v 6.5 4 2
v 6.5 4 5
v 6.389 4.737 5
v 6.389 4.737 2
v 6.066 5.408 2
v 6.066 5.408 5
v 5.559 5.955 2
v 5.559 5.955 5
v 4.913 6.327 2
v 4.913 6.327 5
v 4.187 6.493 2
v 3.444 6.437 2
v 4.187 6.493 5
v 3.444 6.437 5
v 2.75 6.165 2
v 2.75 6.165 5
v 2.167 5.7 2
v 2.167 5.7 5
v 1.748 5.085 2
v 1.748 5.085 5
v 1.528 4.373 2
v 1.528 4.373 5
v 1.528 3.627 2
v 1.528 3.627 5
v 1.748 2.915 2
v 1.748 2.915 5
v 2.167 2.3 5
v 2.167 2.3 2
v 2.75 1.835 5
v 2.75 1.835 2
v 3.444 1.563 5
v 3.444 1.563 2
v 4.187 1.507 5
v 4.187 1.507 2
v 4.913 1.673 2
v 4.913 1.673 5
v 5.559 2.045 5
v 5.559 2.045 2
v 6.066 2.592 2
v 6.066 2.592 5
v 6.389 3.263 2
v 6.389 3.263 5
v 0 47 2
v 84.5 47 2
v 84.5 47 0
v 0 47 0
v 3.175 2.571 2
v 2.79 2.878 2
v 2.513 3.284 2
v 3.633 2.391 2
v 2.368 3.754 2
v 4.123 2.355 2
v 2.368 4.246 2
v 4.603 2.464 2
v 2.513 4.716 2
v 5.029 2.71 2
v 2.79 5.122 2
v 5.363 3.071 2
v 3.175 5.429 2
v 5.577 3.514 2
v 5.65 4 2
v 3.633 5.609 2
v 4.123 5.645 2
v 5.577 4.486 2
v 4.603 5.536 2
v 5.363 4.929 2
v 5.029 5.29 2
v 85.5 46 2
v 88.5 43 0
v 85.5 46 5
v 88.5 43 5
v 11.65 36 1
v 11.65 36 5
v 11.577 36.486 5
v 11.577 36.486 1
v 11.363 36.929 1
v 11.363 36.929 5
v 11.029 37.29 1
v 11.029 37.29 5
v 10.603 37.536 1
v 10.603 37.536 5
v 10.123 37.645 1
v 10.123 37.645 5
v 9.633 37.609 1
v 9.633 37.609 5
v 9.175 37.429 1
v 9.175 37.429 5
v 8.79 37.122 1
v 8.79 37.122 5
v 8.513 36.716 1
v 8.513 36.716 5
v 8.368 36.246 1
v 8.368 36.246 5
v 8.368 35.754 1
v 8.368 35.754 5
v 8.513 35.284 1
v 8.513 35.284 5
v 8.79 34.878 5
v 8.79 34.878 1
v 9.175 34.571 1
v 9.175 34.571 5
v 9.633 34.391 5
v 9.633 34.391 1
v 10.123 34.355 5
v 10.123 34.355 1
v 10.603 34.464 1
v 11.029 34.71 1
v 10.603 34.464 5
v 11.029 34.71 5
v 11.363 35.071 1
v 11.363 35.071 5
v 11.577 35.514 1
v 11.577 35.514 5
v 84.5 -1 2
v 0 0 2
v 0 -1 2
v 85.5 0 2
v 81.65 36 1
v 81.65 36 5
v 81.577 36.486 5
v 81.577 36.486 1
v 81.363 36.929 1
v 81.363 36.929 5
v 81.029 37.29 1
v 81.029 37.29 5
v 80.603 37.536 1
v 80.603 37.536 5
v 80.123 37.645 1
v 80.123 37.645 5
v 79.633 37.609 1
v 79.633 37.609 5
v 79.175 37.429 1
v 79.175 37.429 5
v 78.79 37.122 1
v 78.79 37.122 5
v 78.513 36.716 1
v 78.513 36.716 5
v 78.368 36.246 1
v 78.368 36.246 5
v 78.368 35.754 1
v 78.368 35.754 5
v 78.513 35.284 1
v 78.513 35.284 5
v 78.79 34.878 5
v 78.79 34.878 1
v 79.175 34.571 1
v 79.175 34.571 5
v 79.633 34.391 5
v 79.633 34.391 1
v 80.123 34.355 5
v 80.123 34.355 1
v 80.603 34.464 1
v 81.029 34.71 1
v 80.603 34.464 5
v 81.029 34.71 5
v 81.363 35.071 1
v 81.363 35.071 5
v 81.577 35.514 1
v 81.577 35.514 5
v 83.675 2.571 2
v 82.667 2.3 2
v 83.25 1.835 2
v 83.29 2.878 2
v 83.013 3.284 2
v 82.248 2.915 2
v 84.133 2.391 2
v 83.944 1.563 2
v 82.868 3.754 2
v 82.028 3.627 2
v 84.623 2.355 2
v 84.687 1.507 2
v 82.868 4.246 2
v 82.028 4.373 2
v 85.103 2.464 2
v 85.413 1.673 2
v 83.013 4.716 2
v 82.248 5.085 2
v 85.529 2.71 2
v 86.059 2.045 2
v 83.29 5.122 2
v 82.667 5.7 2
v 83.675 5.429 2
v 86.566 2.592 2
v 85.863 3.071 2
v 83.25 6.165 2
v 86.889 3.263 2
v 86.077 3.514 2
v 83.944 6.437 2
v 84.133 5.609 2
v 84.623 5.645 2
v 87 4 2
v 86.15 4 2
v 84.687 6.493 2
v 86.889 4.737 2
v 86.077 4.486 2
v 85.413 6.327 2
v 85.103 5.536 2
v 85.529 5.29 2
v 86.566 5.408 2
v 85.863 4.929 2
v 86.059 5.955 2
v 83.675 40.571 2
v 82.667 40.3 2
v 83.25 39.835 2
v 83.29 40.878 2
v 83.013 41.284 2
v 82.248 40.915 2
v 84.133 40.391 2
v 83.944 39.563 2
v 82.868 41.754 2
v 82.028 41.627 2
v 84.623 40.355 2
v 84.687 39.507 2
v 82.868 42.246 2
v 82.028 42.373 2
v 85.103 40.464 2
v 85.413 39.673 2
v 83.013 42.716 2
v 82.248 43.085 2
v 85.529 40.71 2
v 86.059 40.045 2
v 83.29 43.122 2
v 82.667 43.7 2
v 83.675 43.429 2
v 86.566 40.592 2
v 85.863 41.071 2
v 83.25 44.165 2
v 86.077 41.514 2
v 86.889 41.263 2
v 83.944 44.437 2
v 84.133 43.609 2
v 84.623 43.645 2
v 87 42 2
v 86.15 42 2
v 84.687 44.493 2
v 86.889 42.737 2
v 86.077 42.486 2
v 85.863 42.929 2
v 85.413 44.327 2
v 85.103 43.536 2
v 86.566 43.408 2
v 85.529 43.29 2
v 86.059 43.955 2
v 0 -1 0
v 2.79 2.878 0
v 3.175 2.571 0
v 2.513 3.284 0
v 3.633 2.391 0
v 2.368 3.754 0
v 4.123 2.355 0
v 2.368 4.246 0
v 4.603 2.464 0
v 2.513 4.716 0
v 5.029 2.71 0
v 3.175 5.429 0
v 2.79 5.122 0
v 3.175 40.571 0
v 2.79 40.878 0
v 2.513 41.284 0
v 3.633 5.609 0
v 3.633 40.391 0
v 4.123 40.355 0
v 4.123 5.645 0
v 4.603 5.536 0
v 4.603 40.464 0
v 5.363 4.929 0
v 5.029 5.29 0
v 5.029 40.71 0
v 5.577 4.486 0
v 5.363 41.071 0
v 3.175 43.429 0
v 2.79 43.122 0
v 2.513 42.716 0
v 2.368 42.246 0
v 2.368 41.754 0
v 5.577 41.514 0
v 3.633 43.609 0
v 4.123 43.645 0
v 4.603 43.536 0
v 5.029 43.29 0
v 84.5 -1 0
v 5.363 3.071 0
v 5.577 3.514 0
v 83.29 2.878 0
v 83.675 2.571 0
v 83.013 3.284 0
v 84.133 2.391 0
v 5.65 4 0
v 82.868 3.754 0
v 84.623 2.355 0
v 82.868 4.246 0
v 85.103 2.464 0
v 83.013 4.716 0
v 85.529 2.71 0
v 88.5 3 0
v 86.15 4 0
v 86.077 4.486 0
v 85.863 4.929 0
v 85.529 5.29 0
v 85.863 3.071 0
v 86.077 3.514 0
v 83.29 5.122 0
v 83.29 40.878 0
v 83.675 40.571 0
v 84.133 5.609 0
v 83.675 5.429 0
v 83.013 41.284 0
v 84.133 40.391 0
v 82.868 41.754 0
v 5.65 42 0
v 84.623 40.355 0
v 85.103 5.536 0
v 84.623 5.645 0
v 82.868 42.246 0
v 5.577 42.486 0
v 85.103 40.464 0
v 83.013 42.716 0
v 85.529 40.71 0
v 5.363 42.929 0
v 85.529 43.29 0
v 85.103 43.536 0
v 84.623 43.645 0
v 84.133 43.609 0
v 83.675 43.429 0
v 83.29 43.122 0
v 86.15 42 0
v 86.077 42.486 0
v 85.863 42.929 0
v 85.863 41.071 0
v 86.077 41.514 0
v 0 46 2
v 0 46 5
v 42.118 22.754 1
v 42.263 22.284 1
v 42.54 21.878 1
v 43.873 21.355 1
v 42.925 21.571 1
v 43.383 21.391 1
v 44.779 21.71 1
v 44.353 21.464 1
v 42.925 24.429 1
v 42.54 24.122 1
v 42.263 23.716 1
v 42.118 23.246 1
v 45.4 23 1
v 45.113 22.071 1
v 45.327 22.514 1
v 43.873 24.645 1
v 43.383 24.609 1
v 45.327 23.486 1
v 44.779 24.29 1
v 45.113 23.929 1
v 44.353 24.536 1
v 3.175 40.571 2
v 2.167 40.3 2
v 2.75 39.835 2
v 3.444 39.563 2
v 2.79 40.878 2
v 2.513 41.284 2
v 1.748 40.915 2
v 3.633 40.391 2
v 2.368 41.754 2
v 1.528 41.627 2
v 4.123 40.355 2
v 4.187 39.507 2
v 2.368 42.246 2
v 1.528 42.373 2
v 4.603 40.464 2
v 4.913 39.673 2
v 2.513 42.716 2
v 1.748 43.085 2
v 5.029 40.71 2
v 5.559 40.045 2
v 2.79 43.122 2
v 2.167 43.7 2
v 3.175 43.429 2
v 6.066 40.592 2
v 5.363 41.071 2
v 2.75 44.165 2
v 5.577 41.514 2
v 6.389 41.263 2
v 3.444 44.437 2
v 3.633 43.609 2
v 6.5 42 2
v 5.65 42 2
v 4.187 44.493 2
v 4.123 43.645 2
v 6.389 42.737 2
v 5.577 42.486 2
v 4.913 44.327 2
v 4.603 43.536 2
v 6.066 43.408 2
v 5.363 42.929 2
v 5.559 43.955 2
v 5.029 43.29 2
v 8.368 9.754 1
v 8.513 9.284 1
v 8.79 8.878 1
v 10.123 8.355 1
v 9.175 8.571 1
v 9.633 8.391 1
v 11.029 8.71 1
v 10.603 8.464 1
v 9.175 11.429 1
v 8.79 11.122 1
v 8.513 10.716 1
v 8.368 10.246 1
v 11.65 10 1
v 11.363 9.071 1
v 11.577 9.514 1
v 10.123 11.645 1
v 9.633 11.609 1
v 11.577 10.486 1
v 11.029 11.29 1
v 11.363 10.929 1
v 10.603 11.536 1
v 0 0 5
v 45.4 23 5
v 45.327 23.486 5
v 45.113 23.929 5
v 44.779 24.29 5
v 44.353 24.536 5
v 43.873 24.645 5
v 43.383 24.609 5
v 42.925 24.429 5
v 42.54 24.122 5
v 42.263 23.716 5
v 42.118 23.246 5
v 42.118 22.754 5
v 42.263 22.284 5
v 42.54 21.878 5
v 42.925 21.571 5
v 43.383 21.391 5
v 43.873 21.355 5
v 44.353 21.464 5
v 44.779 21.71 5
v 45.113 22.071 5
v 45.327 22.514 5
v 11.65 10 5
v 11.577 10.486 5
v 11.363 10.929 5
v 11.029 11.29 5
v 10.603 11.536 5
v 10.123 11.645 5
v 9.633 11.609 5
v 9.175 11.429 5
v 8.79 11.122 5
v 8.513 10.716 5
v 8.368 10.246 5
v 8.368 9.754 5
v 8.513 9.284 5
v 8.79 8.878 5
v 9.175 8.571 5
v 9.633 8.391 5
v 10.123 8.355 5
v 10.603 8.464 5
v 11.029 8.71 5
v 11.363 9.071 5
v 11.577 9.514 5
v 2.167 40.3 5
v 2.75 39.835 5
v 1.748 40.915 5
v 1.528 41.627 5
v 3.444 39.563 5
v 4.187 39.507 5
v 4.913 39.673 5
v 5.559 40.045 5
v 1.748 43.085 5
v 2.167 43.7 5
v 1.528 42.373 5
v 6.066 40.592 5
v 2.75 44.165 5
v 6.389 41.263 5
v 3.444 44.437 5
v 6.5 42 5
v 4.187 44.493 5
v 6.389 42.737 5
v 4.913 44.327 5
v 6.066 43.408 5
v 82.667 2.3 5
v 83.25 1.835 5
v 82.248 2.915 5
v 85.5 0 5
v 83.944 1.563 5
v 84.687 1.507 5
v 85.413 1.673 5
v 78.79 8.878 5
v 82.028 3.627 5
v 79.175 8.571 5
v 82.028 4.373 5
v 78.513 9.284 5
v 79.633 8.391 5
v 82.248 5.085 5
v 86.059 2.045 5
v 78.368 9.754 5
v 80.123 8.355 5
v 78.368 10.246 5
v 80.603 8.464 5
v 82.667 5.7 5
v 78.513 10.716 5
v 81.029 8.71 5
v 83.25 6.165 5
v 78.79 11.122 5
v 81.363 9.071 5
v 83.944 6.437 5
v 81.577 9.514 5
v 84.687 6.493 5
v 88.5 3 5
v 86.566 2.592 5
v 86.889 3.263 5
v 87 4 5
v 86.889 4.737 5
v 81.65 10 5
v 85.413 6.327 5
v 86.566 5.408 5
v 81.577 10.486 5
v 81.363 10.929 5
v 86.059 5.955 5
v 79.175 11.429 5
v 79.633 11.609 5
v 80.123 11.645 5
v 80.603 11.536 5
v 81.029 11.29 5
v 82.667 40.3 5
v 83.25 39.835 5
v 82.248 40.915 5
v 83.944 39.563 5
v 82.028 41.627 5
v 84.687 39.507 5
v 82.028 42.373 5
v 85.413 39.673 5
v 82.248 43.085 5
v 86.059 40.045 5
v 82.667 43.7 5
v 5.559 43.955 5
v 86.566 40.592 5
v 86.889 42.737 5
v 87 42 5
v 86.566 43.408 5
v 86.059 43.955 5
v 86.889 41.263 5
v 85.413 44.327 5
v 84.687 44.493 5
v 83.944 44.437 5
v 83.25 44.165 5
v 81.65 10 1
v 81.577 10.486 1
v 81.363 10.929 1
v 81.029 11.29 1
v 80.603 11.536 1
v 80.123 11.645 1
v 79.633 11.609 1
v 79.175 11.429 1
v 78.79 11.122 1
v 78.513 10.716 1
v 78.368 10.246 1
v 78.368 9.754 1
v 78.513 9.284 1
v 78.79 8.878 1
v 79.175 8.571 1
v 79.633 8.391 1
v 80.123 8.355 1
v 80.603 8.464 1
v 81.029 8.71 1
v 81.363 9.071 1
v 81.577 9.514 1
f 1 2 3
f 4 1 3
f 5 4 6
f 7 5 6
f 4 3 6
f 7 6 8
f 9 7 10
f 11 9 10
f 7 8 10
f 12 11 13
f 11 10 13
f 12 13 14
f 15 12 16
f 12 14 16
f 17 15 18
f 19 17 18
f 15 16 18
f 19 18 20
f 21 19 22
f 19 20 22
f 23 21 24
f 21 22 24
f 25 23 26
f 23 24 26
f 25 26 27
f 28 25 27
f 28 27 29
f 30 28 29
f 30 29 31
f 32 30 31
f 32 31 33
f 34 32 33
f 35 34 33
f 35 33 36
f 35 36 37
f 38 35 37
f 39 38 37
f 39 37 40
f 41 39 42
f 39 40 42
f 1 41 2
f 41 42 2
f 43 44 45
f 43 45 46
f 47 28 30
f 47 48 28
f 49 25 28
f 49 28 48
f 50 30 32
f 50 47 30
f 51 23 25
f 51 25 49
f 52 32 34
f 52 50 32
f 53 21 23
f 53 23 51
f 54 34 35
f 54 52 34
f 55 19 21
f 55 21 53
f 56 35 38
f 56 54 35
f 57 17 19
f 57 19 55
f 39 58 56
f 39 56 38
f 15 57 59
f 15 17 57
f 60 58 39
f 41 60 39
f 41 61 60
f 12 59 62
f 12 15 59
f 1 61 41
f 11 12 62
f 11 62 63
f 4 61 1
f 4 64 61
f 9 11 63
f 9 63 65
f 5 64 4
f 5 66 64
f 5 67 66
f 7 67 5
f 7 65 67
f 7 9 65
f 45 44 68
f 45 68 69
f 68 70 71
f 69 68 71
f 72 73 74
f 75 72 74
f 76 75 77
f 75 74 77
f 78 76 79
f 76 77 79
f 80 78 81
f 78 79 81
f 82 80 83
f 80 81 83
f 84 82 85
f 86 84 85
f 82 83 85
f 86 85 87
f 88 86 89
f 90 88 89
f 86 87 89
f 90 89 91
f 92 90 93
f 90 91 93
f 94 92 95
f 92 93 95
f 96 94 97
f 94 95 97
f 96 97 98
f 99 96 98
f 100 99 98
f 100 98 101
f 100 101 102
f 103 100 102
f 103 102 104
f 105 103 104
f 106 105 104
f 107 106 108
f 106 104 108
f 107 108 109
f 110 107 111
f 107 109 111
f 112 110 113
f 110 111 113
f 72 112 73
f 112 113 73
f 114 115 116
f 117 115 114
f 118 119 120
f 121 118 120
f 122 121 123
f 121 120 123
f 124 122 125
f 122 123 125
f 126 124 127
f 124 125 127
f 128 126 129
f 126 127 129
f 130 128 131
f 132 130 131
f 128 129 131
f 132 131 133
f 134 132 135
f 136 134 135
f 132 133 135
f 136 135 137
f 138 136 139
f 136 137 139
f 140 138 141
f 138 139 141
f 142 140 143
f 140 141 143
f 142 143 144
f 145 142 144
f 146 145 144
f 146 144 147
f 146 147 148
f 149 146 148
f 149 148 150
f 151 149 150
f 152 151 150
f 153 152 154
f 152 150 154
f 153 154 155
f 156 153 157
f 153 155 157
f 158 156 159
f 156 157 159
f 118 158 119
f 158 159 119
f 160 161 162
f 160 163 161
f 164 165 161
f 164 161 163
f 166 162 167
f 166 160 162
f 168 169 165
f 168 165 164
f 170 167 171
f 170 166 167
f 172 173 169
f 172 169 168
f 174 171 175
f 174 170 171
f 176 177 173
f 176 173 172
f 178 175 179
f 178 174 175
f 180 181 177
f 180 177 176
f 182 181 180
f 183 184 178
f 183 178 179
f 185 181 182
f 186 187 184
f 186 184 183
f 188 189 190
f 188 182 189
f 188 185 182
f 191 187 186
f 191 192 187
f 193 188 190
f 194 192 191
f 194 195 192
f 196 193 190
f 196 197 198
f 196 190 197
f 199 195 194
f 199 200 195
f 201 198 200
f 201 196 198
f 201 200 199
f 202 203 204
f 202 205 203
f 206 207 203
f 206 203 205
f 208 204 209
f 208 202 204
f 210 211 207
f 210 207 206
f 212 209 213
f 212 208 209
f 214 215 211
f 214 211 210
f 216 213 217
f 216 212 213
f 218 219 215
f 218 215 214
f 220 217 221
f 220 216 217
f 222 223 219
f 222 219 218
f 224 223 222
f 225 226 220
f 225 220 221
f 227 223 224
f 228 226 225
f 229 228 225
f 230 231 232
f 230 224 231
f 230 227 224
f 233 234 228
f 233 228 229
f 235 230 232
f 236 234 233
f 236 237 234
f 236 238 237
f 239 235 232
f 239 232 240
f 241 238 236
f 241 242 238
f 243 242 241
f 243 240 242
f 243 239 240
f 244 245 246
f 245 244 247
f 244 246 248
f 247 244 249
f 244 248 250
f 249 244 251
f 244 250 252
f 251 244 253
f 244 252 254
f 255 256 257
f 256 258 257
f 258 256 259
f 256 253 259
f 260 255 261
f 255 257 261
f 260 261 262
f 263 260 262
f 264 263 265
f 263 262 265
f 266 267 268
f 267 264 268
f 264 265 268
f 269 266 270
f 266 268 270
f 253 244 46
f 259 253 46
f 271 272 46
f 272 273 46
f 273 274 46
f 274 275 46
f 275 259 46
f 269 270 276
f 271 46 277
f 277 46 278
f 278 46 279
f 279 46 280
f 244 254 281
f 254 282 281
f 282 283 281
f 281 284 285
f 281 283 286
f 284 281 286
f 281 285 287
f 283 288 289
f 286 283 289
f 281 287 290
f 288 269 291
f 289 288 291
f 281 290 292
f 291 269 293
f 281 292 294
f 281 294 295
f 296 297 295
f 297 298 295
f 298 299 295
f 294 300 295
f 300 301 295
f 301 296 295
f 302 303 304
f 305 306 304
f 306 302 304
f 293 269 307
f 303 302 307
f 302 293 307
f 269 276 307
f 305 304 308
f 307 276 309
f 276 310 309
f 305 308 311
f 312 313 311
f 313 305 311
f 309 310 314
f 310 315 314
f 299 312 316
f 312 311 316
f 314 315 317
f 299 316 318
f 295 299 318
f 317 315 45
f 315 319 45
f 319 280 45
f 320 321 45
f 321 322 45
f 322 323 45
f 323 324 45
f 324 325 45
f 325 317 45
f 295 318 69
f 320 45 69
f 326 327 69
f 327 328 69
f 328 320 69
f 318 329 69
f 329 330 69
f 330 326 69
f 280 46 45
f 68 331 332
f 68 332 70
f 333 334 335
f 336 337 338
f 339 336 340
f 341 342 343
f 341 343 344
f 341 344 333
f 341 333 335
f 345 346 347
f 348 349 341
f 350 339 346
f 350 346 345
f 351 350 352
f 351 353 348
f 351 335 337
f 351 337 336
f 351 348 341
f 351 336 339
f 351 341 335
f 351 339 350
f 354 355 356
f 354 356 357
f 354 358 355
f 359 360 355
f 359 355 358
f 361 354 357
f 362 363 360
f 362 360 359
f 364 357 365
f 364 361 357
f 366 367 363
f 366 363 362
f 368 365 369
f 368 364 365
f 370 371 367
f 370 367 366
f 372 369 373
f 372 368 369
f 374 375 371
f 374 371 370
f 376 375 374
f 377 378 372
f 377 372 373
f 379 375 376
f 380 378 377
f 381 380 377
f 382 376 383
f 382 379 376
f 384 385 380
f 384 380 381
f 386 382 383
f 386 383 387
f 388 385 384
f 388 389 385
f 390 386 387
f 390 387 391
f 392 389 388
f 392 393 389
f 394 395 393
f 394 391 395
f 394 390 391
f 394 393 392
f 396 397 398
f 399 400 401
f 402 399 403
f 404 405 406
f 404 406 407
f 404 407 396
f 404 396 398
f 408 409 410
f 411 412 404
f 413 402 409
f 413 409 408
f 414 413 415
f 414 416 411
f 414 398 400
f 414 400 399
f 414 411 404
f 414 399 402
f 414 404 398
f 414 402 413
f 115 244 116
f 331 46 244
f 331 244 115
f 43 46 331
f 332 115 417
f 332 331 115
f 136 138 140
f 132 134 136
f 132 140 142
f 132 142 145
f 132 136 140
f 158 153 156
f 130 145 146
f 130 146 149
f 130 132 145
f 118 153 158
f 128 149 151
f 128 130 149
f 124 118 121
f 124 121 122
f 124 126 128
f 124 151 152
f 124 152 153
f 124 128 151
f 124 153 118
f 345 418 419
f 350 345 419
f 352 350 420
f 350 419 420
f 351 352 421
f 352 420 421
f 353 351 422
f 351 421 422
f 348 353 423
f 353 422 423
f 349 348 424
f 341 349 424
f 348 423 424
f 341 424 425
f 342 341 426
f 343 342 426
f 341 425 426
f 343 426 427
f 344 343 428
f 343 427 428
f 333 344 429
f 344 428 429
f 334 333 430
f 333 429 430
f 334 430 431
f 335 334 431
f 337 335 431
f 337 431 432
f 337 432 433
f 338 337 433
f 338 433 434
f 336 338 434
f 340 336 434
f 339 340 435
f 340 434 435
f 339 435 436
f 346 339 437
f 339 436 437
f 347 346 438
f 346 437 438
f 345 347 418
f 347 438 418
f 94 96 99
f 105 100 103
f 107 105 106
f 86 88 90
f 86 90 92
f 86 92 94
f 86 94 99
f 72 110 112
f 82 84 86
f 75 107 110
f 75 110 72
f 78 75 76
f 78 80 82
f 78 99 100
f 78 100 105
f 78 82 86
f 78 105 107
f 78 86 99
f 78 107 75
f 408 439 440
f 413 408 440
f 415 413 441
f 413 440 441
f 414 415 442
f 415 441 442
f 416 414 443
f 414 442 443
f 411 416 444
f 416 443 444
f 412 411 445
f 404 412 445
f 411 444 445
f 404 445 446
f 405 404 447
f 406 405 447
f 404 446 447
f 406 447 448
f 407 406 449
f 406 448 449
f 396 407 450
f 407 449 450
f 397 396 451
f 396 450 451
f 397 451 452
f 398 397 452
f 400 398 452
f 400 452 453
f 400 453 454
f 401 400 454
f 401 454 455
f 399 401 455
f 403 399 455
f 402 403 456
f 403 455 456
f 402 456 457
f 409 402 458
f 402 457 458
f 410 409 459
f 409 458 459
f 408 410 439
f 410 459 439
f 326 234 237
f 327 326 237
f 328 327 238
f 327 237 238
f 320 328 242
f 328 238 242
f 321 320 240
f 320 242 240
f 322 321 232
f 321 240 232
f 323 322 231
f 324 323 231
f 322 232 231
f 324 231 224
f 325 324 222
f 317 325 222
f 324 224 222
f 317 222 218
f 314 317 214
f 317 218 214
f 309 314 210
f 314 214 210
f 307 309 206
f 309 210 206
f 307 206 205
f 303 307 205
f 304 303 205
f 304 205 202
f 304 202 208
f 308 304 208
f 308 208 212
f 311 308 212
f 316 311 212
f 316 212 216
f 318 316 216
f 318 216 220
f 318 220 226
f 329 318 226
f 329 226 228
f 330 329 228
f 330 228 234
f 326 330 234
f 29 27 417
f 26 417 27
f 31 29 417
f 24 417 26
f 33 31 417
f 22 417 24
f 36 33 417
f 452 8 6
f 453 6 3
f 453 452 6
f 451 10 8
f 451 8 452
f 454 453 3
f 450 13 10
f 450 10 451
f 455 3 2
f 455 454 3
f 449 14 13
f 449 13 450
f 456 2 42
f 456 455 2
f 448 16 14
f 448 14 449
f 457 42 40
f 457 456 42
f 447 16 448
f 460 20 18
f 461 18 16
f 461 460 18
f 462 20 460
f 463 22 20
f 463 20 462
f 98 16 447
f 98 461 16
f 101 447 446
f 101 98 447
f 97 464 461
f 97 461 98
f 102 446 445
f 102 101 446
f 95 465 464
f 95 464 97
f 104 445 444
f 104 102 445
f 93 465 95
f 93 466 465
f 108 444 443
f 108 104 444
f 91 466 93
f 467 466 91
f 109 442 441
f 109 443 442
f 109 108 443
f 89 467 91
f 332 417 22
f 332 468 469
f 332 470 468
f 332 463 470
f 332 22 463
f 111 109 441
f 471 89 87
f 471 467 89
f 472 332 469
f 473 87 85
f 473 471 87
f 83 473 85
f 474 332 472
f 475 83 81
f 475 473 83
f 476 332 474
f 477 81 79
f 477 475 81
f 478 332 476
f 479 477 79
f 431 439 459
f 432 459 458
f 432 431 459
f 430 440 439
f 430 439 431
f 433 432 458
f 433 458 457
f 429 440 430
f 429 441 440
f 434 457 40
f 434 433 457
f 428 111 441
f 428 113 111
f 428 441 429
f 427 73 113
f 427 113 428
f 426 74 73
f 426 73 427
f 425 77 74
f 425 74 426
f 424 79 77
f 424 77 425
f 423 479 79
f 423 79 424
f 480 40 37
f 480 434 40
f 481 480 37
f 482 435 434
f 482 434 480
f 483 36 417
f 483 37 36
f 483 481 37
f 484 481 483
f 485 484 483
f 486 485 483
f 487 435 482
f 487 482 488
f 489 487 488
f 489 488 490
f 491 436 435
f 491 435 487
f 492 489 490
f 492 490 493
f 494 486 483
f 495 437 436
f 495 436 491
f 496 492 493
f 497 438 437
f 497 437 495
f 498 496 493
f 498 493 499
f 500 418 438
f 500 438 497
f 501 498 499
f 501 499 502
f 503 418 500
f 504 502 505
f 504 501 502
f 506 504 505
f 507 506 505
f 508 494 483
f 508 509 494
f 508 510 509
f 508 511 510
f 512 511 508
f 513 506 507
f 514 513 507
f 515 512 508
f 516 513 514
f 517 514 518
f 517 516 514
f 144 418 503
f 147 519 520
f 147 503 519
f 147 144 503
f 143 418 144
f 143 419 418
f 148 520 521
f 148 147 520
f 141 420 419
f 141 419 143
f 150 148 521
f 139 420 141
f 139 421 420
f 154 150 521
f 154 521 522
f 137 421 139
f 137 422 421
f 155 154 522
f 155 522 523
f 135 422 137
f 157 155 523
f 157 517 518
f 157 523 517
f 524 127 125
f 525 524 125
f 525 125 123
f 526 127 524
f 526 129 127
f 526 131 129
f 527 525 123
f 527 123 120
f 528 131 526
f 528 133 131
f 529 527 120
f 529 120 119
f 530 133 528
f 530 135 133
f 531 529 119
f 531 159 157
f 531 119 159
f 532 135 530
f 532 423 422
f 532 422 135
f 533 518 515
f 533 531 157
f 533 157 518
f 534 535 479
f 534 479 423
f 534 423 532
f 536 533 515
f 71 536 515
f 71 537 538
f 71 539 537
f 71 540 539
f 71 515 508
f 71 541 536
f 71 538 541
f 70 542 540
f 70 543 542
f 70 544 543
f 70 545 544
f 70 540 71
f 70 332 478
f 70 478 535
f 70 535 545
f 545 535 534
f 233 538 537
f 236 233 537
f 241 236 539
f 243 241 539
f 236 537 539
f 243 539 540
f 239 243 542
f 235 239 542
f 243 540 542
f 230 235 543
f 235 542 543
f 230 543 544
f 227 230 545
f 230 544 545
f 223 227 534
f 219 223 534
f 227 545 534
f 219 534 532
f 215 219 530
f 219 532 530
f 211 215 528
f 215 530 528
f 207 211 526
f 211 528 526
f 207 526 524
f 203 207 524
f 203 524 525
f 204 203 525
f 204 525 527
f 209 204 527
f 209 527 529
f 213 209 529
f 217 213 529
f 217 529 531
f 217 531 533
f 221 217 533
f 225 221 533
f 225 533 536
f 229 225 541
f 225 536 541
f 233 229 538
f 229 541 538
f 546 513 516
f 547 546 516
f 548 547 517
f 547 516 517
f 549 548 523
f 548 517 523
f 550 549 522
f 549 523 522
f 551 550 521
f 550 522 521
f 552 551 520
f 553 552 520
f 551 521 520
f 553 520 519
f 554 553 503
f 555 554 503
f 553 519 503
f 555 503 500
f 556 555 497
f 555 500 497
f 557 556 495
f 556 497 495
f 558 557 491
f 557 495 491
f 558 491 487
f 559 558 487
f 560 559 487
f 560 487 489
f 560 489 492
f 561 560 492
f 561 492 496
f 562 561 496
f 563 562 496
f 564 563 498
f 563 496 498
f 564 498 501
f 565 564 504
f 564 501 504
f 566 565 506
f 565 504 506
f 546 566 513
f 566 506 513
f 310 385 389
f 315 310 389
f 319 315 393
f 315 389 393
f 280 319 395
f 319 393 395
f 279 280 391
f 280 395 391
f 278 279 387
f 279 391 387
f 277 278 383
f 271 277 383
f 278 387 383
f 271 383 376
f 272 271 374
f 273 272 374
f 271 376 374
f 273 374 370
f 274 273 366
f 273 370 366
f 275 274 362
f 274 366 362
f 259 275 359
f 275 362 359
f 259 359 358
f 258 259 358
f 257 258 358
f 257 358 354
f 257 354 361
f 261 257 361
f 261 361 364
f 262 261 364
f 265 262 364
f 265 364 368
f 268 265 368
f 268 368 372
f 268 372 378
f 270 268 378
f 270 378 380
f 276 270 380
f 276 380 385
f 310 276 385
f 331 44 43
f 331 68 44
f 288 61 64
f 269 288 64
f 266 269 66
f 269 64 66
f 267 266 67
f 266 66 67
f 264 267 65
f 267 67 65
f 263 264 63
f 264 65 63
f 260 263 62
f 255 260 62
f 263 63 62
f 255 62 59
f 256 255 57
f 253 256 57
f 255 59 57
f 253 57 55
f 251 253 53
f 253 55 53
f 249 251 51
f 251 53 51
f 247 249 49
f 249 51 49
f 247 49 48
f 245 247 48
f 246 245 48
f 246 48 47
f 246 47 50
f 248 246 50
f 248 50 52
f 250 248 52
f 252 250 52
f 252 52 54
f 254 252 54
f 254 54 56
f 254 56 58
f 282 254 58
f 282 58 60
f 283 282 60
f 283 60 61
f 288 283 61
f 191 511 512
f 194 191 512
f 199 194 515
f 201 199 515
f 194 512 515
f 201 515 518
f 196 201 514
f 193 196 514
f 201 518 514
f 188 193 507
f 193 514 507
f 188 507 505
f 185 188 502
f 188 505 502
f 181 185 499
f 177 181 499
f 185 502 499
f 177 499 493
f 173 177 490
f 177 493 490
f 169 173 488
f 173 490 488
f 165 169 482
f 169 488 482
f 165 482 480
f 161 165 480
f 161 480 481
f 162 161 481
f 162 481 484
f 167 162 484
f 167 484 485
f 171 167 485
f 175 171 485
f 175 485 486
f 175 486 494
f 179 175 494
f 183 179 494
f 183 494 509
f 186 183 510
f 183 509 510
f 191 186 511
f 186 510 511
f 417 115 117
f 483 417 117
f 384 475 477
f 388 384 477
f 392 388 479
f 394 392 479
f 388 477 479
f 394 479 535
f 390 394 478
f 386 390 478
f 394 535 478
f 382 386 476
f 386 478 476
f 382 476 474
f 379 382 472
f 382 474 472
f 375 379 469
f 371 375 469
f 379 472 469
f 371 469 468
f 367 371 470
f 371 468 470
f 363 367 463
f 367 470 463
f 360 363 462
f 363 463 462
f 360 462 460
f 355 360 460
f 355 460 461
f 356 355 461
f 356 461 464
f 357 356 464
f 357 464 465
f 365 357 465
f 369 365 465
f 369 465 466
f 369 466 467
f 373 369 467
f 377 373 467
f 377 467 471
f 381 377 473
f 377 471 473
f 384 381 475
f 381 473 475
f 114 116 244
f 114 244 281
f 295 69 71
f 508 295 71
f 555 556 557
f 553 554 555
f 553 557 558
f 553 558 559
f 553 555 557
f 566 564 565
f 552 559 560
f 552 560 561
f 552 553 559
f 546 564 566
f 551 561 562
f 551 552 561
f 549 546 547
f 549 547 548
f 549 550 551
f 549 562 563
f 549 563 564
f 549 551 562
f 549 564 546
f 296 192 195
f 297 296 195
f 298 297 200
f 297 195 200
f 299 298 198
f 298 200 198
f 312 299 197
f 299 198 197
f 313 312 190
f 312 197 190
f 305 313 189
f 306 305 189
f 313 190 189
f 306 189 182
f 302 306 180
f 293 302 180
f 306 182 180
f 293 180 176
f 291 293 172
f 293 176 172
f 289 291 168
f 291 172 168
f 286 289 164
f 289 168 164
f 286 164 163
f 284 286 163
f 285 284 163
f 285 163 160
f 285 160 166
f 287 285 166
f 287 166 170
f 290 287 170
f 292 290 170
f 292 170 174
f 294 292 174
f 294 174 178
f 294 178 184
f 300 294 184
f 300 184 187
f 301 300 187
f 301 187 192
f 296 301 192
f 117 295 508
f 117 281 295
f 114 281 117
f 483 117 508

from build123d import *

# Parameters (mm, degrees)
F0_W      = 88.5
F0_H      = 46
F1_DEPTH  = 5
F2_R      = 2.5
F6_DEPTH  = 3
F3_R      = 2.5
F7_DEPTH  = 3
F4_R      = 2.5
F8_DEPTH  = 3
F5_R      = 2.5
F9_DEPTH  = 3
F12_R     = 1.65
F14_DEPTH = 3
F13_R     = 1.65
F15_DEPTH = 3
F11_R     = 1.65
F16_DEPTH = 3
F10_R     = 1.65
F17_DEPTH = 3
F18_R     = 1.65
F19_DEPTH = 4
F20_R     = 1.65
F21_R     = 1.65
F24_DEPTH = 4
F22_R     = 1.65
F23_R     = 1.65
F25_DEPTH = 4
F26_W     = 88.5
F26_H     = 2
F27_DEPTH = 1
F28_W     = 88.5
F28_H     = 2
F29_DEPTH = 1
F30_SIZE  = 3
F32_DEPTH = 3
F33_SIZE  = 3
F35_DEPTH = 3


with BuildPart() as f1:
    # F0 (on Top) → F1 (new body)
    with BuildSketch(Plane.XY):
        with Locations((44.25, 23)):
            Rectangle(F0_W, F0_H)
    extrude(amount=F1_DEPTH)

    # F2 (on face) → F6 (cut)
    with BuildSketch(Plane.XY.offset(5)):
        with Locations((4, 42)):
            Circle(F2_R)
    extrude(amount=-F6_DEPTH, mode=Mode.SUBTRACT)

    # F3 (on face) → F7 (cut)
    with BuildSketch(Plane.XY.offset(5)):
        with Locations((4, 4)):
            Circle(F3_R)
    extrude(amount=-F7_DEPTH, mode=Mode.SUBTRACT)

    # F4 (on face) → F8 (cut)
    with BuildSketch(Plane.XY.offset(5)):
        with Locations((84.5, 42)):
            Circle(F4_R)
    extrude(amount=-F8_DEPTH, mode=Mode.SUBTRACT)

    # F5 (on face) → F9 (cut)
    with BuildSketch(Plane.XY.offset(5)):
        with Locations((84.5, 4)):
            Circle(F5_R)
    extrude(amount=-F9_DEPTH, mode=Mode.SUBTRACT)

    # F12 (on face) → F14 (cut)
    with BuildSketch(Plane.XY.offset(2)):
        with Locations((84.5, 42)):
            Circle(F12_R)
    extrude(amount=-F14_DEPTH, mode=Mode.SUBTRACT)

    # F13 (on face) → F15 (cut)
    with BuildSketch(Plane.XY.offset(2)):
        with Locations((84.5, 4)):
            Circle(F13_R)
    extrude(amount=-F15_DEPTH, mode=Mode.SUBTRACT)

    # F11 (on face) → F16 (cut)
    with BuildSketch(Plane.XY.offset(2)):
        with Locations((4, 4)):
            Circle(F11_R)
    extrude(amount=-F16_DEPTH, mode=Mode.SUBTRACT)

    # F10 (on face) → F17 (cut)
    with BuildSketch(Plane.XY.offset(2)):
        with Locations((4, 42)):
            Circle(F10_R)
    extrude(amount=-F17_DEPTH, mode=Mode.SUBTRACT)

    # F18 (on face) → F19 (cut)
    with BuildSketch(Plane.XY.offset(5)):
        with Locations((43.75, 23)):
            Circle(F18_R)
    extrude(amount=-F19_DEPTH, mode=Mode.SUBTRACT)

    # F20 (on face) + F21 (on face) → F24 (cut)
    with BuildSketch(Plane.XY.offset(5)):
        with Locations((10, 36)):
            Circle(F20_R)
    with BuildSketch(Plane.XY.offset(5)):
        with Locations((10, 10)):
            Circle(F21_R)
    extrude(amount=-F24_DEPTH, mode=Mode.SUBTRACT)

    # F22 (on face) + F23 (on face) → F25 (cut)
    with BuildSketch(Plane.XY.offset(5)):
        with Locations((80, 36)):
            Circle(F22_R)
    with BuildSketch(Plane.XY.offset(5)):
        with Locations((80, 10)):
            Circle(F23_R)
    extrude(amount=-F25_DEPTH, mode=Mode.SUBTRACT)

    # F26 (on face) → F27 (join)
    with BuildSketch(Plane(origin=(0, 46, 0), x_dir=(-1, 0, 0), z_dir=(0, 1, 0))):
        with Locations((-44.25, 1)):
            Rectangle(F26_W, F26_H)
    extrude(amount=F27_DEPTH)

    # F28 (on face) → F29 (join)
    with BuildSketch(Plane.XZ):
        with Locations((44.25, 1)):
            Rectangle(F28_W, F28_H)
    extrude(amount=F29_DEPTH)

    # F30
    f30_edges = [f1.edges().sort_by_distance(p)[0] for p in [
        (88.5, 0, 3.5),
    ]]
    chamfer(f30_edges, length=F30_SIZE)

    # F31 (on face) → F32 (cut)
    with BuildSketch(Plane.XY.offset(2)):
        Polygon((88.5, 0), (88.5, 3), (85.5, 0), (84.5, -1), (88.5, -1), align=None)
    extrude(amount=-F32_DEPTH, mode=Mode.SUBTRACT)

    # F33
    f33_edges = [f1.edges().sort_by_distance(p)[0] for p in [
        (88.5, 46, 3.5),
    ]]
    chamfer(f33_edges, length=F33_SIZE)

    # F34 (on face) → F35 (cut)
    with BuildSketch(Plane.XY.offset(2)):
        Polygon((85.5, 46), (88.5, 43), (88.5, 46), (88.5, 47), (84.5, 47), align=None)
    extrude(amount=-F35_DEPTH, mode=Mode.SUBTRACT)


solid = f1.part
